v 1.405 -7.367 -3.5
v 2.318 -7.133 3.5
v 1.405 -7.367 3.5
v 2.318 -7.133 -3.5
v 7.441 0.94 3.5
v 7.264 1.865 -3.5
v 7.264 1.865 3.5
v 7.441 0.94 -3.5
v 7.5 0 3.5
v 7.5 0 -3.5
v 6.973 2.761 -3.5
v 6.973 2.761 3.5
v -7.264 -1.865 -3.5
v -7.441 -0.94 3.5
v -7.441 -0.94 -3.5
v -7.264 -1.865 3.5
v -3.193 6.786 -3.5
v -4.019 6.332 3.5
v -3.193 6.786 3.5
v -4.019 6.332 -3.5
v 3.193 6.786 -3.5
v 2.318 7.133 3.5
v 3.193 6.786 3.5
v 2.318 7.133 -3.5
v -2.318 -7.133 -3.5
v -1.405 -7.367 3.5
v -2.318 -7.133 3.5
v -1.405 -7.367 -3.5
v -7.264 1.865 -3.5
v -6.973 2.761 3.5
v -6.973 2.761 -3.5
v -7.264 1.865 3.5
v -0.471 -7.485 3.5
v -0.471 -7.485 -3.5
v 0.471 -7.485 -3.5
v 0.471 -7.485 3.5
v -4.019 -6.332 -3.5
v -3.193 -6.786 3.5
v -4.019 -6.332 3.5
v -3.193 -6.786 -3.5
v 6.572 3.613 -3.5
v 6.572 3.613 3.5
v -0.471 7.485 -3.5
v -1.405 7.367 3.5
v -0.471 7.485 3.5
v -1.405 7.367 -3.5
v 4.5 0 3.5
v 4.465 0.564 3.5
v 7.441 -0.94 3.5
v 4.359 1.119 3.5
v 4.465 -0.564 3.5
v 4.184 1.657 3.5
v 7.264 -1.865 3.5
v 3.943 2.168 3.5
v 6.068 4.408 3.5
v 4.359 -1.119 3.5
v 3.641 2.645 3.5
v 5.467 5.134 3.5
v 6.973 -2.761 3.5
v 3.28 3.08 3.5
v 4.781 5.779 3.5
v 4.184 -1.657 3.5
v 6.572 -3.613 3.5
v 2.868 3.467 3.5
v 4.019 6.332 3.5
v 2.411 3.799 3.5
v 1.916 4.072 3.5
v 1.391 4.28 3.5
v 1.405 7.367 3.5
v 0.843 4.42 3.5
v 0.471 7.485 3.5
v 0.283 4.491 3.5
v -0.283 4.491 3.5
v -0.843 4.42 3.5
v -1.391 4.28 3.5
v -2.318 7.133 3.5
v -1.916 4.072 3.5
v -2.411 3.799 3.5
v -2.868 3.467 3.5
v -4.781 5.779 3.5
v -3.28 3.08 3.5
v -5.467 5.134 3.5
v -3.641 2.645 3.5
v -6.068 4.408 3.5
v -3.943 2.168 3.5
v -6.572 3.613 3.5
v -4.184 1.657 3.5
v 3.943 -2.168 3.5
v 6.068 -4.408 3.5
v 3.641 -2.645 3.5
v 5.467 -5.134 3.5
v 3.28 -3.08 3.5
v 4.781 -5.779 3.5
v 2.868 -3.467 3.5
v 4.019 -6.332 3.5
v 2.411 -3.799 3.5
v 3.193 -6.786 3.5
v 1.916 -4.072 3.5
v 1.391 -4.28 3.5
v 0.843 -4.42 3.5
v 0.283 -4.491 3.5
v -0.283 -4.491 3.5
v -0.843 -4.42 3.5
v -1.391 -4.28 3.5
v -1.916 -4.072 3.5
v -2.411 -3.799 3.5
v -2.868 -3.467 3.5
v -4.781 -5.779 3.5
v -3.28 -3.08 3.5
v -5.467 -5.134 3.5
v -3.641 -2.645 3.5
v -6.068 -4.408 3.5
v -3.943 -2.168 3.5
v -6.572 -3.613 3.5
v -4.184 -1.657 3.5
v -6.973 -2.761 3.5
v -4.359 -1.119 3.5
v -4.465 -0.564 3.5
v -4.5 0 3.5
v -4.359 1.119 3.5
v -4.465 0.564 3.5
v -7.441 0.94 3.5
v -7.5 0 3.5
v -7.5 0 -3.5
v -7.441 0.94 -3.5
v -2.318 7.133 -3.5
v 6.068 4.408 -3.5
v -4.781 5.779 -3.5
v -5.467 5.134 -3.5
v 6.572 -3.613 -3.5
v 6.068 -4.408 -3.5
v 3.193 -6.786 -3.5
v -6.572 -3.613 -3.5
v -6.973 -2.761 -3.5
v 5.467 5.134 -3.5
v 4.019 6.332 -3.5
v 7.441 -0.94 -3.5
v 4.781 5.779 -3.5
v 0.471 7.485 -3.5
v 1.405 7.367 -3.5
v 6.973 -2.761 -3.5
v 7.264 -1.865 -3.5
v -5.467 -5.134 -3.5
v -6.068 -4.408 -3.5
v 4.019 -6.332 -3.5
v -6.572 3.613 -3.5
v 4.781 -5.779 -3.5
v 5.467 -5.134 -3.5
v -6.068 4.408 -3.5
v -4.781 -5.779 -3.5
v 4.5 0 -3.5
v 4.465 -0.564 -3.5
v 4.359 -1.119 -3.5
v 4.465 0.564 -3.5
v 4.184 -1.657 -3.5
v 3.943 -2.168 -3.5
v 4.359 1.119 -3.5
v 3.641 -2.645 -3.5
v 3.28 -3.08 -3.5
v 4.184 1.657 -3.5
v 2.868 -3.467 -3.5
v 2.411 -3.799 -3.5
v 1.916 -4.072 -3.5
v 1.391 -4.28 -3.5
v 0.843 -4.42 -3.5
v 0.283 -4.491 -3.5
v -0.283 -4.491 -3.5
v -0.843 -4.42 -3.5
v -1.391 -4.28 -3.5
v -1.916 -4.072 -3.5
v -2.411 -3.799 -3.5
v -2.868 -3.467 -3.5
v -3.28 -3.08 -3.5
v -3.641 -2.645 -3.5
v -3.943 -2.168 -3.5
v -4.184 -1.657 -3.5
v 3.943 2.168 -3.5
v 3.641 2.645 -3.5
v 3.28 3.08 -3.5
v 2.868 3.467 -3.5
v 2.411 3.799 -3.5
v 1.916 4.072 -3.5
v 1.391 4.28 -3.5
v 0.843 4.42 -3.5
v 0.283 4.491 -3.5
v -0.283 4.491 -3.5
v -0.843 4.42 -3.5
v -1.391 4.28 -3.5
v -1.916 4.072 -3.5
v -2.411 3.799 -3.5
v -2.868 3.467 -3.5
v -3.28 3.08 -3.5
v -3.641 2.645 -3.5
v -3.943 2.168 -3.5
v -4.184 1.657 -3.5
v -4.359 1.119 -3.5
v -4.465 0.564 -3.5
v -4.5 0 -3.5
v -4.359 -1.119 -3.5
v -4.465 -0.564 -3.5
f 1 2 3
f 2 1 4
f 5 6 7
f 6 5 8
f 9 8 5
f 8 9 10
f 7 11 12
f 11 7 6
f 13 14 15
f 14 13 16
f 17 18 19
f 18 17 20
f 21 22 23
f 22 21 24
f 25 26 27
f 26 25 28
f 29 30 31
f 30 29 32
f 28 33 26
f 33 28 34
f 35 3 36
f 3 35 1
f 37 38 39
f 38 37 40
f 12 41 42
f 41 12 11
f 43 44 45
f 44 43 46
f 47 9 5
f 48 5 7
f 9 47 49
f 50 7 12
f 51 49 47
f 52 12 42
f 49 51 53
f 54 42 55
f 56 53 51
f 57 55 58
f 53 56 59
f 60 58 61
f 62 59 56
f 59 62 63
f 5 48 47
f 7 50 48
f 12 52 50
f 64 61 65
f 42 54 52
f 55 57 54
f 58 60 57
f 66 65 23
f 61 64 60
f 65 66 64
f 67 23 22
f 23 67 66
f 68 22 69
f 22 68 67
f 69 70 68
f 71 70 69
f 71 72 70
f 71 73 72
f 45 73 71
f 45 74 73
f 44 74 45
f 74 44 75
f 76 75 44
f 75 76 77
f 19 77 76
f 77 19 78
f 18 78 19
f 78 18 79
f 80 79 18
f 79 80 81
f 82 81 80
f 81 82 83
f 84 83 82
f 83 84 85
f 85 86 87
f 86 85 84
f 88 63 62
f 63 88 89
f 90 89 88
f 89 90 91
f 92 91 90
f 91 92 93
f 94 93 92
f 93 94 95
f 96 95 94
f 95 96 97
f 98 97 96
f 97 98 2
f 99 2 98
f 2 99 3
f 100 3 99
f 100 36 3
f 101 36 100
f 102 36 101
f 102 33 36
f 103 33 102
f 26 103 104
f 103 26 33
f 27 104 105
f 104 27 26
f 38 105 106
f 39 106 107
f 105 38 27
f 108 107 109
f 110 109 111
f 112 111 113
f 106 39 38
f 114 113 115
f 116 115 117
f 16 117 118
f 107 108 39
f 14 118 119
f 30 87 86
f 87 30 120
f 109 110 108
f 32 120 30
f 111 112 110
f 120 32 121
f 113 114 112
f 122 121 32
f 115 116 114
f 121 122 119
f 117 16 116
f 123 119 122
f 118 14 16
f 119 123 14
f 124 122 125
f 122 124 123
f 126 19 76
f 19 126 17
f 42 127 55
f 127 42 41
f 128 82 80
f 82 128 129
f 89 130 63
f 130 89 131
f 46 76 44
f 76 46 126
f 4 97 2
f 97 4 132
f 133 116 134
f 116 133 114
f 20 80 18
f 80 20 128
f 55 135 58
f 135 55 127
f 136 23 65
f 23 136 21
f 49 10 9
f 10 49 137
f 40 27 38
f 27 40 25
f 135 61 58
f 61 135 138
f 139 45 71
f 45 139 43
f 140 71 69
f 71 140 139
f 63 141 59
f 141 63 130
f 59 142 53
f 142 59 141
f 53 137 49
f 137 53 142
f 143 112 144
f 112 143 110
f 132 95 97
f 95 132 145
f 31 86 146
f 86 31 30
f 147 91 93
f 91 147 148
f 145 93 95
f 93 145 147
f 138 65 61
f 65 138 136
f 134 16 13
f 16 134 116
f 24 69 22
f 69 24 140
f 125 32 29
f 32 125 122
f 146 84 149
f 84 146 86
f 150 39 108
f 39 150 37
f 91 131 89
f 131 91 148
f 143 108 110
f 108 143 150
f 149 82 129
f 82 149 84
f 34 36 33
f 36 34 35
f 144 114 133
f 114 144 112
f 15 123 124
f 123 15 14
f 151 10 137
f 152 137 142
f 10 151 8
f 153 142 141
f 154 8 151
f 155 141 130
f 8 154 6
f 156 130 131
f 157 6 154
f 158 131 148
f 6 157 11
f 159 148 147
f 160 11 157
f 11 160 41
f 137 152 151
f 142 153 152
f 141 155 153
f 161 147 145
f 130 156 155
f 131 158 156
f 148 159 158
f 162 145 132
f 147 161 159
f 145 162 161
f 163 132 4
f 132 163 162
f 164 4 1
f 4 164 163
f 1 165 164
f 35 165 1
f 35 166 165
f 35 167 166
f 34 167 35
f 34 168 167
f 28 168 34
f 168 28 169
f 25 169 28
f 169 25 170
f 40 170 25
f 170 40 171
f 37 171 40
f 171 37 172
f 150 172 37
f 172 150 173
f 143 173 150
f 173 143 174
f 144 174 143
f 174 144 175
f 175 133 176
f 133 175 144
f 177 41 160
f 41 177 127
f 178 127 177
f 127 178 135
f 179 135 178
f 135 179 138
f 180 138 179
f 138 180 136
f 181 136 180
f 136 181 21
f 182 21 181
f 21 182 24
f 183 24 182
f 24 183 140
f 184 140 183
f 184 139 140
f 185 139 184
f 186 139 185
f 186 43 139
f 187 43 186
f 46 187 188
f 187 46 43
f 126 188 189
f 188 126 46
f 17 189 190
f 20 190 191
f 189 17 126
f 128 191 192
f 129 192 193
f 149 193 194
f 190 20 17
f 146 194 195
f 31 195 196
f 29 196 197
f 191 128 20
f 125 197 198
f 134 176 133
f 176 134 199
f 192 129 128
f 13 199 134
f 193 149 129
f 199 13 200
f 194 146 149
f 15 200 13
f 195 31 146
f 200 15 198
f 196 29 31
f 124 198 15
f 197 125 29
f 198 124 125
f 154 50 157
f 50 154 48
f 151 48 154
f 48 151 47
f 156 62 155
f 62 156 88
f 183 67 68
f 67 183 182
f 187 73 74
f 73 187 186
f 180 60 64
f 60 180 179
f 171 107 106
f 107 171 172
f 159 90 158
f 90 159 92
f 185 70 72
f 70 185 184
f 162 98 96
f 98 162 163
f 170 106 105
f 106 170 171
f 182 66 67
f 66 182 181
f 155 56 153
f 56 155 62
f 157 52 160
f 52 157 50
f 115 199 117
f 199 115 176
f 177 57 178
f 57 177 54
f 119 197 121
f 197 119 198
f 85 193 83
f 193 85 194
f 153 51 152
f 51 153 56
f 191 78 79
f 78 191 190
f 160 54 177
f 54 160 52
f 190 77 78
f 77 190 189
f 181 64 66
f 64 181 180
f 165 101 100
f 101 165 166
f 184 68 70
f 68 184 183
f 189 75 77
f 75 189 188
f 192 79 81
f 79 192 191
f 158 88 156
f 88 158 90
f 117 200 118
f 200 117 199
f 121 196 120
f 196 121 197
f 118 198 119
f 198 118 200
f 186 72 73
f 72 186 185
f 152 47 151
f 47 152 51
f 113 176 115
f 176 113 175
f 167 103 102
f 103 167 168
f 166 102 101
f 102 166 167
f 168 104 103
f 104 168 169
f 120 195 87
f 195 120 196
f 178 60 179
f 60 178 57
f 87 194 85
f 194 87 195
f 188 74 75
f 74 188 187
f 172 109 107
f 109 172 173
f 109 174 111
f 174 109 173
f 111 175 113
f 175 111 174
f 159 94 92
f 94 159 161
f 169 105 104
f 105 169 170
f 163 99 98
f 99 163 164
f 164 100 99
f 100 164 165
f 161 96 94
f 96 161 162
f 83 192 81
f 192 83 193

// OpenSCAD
$fn = 50;


difference() {
	union() {
		translate(v = [0, 0, -3.5000000000]) {
			cylinder(h = 7, r = 7.5000000000);
		}
	}
	union() {
		translate(v = [0, 0, -100.0000000000]) {
			cylinder(h = 200, r = 4.5000000000);
		}
	}
}
